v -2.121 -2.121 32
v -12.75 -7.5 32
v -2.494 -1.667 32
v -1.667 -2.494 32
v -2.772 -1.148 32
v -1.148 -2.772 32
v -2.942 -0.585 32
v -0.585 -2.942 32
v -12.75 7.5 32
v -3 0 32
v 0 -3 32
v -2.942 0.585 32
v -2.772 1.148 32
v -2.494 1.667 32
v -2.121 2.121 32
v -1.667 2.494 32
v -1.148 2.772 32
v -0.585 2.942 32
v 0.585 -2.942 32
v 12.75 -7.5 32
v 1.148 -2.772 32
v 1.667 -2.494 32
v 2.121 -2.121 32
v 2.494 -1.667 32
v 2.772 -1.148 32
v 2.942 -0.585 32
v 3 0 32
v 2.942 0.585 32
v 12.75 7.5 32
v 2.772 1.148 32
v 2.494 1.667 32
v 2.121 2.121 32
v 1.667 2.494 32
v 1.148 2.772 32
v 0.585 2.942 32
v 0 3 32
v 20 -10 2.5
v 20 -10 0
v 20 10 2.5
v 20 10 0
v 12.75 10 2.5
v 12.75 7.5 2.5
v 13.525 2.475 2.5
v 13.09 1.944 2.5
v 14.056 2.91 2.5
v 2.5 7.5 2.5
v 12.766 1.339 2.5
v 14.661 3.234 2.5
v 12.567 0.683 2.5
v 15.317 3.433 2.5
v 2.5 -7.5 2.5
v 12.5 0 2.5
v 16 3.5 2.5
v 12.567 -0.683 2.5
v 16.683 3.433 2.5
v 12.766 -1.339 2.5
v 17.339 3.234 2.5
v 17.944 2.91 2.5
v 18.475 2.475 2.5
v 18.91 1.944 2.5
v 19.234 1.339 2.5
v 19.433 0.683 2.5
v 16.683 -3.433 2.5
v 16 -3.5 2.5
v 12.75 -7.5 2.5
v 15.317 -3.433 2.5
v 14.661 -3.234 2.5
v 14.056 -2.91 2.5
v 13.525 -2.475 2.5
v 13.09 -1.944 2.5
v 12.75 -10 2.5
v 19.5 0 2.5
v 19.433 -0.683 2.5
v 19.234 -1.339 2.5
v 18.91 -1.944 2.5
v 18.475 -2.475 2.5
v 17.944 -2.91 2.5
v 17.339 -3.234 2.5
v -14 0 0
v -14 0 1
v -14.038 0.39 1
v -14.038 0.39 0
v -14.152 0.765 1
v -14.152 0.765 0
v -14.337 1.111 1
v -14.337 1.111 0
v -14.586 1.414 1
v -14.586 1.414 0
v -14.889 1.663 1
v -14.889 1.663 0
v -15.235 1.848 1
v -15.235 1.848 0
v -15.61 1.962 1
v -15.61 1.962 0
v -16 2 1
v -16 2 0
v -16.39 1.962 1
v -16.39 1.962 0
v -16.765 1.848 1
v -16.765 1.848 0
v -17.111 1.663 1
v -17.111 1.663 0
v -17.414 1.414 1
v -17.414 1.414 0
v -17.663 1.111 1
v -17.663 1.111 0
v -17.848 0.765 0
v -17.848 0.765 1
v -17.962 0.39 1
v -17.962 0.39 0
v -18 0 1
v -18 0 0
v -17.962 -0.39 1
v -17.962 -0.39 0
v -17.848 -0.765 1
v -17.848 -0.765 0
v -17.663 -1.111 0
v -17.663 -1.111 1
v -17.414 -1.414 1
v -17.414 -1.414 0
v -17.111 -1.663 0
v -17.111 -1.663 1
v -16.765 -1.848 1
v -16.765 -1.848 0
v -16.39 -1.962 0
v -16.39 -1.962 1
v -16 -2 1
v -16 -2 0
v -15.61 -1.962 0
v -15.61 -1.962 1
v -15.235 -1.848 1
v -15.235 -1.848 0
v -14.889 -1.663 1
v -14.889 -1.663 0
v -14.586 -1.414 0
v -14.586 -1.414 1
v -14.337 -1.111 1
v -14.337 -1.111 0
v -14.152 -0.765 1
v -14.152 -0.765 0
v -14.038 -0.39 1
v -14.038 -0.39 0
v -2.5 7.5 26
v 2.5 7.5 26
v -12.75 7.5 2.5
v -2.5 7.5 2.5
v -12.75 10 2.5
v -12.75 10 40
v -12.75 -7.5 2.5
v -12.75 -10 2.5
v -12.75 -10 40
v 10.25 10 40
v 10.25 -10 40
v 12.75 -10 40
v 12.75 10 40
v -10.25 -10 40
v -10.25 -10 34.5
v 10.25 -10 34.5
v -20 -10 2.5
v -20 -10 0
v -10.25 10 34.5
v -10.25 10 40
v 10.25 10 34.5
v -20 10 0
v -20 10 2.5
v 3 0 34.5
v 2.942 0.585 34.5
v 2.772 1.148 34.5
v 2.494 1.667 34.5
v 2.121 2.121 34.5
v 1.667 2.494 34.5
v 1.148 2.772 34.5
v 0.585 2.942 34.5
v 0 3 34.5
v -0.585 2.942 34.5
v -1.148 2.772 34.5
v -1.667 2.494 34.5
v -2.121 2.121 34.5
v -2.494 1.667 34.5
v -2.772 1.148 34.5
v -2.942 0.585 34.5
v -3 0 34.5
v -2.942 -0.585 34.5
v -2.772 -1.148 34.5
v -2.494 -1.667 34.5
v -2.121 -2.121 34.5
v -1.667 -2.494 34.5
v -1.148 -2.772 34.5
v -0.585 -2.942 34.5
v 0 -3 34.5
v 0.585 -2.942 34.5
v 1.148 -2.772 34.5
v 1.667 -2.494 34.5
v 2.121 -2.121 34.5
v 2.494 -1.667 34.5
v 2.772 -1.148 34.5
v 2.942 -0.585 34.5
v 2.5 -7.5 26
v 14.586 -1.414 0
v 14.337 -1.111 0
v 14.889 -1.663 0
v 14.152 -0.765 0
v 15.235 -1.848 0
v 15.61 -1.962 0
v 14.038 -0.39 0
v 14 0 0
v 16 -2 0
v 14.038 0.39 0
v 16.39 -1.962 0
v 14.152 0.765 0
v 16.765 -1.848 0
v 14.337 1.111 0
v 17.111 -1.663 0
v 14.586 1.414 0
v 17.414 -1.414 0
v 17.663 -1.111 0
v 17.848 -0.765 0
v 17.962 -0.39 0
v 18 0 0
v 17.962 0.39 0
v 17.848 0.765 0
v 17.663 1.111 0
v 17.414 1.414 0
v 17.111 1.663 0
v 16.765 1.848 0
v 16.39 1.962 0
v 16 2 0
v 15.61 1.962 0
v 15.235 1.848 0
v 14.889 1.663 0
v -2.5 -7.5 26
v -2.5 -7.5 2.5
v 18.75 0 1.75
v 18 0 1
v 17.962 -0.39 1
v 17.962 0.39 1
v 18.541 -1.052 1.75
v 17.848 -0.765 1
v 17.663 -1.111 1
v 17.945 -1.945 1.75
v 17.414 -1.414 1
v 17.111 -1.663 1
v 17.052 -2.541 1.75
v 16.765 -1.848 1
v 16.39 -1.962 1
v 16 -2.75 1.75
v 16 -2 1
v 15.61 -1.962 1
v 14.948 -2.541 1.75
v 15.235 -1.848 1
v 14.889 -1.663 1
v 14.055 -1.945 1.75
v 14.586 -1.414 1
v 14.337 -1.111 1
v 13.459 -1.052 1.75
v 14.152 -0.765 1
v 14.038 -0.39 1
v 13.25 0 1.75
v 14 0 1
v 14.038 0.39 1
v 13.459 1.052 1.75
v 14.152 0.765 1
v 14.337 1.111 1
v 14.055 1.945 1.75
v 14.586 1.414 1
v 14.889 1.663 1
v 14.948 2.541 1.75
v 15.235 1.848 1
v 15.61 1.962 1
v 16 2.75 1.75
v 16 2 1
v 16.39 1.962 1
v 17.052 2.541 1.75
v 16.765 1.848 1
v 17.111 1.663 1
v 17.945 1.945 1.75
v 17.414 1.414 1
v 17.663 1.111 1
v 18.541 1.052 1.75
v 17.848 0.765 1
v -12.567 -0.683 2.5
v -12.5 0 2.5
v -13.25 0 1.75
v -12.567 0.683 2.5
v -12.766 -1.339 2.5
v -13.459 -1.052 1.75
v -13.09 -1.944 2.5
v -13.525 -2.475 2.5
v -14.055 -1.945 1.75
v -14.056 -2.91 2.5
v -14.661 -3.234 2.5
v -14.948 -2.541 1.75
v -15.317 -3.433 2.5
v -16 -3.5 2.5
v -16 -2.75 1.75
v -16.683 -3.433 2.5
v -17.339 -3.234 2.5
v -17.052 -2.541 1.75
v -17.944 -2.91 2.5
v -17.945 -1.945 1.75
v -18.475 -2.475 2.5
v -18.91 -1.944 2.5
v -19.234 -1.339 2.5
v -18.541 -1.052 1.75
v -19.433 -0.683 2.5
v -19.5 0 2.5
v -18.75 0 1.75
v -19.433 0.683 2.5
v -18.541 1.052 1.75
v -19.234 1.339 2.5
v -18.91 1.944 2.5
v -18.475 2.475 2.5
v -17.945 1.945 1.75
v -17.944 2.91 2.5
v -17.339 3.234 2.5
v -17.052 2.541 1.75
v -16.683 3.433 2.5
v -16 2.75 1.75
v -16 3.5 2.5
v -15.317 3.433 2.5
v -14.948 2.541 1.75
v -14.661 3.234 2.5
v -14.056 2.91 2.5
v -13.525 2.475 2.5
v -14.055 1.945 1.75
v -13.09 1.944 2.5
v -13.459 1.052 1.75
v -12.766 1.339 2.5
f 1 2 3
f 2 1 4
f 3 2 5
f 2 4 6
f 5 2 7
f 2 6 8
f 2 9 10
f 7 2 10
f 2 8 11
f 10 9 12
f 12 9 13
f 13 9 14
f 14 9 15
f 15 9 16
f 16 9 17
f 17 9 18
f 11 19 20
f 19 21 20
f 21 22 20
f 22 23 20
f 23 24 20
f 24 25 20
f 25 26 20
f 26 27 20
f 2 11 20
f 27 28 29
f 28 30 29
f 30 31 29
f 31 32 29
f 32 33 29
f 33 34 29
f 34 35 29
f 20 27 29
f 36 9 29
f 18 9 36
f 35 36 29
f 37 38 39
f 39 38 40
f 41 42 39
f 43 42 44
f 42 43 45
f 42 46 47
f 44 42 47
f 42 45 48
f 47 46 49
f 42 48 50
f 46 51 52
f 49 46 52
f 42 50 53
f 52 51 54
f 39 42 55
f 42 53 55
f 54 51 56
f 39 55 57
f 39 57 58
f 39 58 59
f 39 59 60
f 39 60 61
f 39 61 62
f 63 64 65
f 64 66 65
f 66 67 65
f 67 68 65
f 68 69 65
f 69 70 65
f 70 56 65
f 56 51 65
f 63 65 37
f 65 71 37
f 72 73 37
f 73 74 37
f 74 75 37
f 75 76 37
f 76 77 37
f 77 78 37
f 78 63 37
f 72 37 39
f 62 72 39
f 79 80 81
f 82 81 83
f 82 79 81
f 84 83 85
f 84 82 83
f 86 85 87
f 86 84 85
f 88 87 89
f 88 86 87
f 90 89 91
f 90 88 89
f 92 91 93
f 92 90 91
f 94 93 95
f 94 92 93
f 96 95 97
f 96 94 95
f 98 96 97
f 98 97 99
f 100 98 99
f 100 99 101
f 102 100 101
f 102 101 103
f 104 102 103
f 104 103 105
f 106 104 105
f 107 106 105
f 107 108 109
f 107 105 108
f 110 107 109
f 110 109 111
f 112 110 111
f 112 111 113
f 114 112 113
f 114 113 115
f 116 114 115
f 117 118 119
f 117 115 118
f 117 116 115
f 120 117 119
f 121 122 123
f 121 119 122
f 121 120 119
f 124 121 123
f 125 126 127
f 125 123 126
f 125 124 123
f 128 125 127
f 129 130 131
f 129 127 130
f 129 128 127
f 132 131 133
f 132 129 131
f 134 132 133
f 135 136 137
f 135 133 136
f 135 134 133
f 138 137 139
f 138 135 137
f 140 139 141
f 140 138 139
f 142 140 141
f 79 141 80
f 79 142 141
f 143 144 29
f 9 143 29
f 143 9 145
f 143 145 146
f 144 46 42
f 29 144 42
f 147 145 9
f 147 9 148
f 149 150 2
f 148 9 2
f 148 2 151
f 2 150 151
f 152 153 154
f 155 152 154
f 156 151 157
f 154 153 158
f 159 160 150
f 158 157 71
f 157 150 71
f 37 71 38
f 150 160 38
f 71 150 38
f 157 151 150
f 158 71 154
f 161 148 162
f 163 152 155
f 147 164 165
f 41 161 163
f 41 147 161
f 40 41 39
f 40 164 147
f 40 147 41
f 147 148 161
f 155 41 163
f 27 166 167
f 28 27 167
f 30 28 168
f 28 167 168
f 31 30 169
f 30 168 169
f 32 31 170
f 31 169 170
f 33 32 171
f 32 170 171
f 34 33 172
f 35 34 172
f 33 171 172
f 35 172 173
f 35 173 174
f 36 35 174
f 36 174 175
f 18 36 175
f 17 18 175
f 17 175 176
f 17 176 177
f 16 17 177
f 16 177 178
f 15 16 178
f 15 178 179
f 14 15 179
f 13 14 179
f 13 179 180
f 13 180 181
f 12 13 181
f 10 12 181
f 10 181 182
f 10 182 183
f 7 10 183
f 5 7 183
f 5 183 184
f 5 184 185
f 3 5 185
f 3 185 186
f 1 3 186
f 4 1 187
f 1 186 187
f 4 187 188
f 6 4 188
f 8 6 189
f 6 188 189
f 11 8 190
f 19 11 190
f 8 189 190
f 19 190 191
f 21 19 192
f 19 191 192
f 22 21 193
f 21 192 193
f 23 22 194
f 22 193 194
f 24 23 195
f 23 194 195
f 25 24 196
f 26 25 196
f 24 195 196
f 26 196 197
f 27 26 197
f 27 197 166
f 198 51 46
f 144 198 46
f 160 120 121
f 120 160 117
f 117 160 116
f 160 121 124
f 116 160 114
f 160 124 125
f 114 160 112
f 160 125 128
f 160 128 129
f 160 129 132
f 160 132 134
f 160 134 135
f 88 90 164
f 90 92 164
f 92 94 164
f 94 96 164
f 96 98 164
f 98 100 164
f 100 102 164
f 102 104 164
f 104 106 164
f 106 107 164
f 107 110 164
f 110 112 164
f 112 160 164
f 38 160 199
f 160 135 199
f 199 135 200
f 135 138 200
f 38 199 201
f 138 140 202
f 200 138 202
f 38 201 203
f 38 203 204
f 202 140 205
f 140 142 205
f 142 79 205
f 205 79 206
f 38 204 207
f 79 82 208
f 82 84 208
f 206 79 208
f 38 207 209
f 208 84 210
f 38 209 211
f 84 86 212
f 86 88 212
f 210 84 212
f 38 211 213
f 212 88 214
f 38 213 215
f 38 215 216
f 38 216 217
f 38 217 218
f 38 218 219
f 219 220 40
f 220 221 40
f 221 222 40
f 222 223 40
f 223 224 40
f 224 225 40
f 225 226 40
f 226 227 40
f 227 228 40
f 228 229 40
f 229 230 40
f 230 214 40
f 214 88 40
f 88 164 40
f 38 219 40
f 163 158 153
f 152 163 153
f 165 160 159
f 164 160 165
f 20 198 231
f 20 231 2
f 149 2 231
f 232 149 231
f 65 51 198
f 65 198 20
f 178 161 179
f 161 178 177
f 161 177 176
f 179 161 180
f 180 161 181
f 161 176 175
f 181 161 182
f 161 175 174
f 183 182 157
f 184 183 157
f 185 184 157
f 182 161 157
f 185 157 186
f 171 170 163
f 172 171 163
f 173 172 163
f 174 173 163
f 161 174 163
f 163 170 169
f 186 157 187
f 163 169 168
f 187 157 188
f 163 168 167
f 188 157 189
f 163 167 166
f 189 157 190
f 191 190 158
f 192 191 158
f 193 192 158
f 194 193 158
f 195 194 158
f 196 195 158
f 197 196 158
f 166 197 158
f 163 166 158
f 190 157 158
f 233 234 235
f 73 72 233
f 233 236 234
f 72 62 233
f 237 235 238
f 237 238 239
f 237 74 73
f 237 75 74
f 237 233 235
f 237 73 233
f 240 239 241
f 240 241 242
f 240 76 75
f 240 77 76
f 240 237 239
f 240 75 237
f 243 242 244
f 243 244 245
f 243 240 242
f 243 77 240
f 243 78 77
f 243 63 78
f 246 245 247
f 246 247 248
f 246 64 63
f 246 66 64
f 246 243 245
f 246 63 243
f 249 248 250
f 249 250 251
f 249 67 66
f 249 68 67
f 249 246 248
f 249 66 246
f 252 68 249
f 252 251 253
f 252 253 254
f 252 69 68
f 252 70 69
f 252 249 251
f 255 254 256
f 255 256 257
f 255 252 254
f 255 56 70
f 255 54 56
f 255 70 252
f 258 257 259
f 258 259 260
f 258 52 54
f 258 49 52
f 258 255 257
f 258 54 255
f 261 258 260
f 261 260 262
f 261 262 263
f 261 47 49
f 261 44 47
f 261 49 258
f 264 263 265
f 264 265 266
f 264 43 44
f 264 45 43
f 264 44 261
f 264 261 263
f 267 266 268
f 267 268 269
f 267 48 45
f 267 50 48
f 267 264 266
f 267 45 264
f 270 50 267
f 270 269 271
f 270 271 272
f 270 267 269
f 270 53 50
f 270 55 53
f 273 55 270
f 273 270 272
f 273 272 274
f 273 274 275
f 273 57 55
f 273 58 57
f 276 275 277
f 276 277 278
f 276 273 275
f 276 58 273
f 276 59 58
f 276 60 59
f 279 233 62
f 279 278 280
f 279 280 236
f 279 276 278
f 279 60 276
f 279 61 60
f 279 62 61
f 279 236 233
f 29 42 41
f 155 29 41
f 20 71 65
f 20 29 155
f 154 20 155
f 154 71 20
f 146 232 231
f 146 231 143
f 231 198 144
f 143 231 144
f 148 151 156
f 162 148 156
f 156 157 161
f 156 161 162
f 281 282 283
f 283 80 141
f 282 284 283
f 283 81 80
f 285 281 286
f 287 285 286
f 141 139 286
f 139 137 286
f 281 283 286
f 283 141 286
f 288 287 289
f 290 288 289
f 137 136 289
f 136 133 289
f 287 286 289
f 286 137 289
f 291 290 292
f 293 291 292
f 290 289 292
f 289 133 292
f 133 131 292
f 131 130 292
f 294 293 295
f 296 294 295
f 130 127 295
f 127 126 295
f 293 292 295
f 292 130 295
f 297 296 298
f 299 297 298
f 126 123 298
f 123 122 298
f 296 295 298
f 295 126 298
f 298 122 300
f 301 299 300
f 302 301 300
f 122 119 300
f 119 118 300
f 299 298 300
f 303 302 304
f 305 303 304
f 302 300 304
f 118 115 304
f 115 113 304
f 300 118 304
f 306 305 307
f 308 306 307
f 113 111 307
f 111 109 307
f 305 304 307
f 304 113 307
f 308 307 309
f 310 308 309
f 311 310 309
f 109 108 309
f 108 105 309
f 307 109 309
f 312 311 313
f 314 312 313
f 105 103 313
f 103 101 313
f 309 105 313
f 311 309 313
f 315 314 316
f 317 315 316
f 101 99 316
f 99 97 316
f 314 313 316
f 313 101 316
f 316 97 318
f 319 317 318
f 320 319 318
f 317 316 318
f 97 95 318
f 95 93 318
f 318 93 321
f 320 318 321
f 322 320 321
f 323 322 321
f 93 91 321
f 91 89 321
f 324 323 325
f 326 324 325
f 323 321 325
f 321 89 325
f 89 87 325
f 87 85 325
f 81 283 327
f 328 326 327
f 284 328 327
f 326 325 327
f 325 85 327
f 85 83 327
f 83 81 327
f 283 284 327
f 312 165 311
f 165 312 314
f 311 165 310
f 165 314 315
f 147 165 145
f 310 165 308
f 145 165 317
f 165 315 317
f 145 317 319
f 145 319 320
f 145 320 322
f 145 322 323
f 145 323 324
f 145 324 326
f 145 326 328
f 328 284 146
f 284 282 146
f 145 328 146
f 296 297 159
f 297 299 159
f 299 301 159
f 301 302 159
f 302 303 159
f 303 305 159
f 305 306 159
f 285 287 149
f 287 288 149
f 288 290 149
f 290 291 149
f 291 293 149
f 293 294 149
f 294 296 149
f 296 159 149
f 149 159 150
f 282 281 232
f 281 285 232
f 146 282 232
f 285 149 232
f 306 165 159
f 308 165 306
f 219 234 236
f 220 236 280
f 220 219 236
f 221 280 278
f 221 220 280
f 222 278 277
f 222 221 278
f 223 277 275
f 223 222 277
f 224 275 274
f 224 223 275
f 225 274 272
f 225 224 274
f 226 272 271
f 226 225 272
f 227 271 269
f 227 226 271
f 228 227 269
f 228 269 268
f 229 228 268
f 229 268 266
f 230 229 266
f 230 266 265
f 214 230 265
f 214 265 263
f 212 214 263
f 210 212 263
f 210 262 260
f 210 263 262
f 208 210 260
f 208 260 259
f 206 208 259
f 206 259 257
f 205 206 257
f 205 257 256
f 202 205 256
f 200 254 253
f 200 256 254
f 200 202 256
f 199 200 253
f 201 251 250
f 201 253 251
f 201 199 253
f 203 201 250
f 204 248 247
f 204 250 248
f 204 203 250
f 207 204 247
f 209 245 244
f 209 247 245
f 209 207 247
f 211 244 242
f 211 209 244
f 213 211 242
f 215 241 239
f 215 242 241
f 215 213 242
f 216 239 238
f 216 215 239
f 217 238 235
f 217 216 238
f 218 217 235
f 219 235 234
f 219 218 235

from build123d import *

# Parameters (mm, degrees)
F0_W          = 40
F0_H          = 20
F1_DEPTH      = 40
F3_START      = 2.5
F2_W          = 17.5
F2_H          = 15
F3_DEPTH      = 29.5
F4_W          = 20.5
F4_H          = 5.5
F4_W_2        = 7.25
F4_H_2        = 37.5
F5_DEPTH      = 25
F5_DEPTH_BACK = 25
F6_W          = 15
F6_H          = 6
F7_DEPTH      = 25
F7_DEPTH_BACK = 25
F8_R          = 2
F9_DEPTH      = 25
F9_DEPTH_BACK = 25
F10_SIZE      = 1.5
F12_R         = 3
F13_DEPTH     = 3


with BuildPart() as f1:
    # F0 (on Top) → F1 (new body)
    with BuildSketch(Plane.XY):
        Rectangle(F0_W, F0_H)
    extrude(amount=F1_DEPTH)

    # F2 (on Top) → F3 (cut)
    with BuildSketch(Plane.XY.offset(F3_START)):
        with Locations((-11.25, 0)):
            Rectangle(F2_W, F2_H)
        with Locations((11.25, 0)):
            Rectangle(F2_W, F2_H)
    extrude(amount=F3_DEPTH, mode=Mode.SUBTRACT)

    # F4 (on Front) → F5 (cut, two sides)
    with BuildSketch(Plane.XZ) as f5_sk:
        with Locations((0, 37.25)):
            Rectangle(F4_W, F4_H)
        with Locations((-16.375, 21.25)):
            Rectangle(F4_W_2, F4_H_2)
        with Locations((16.375, 21.25)):
            Rectangle(F4_W_2, F4_H_2)
    extrude(amount=-F5_DEPTH, mode=Mode.SUBTRACT)
    extrude(f5_sk.sketch, amount=F5_DEPTH_BACK, mode=Mode.SUBTRACT)

    # F6 (on Right) → F7 (cut, two sides)
    with BuildSketch(Plane.YZ) as f7_sk:
        with Locations((0, 29)):
            Rectangle(F6_W, F6_H)
    extrude(amount=-F7_DEPTH, mode=Mode.SUBTRACT)
    extrude(f7_sk.sketch, amount=F7_DEPTH_BACK, mode=Mode.SUBTRACT)

    # F8 (on Top) → F9 (cut, two sides)
    with BuildSketch(Plane.XY) as f9_sk:
        with Locations((-16, 0)):
            Circle(F8_R)
        with Locations((16, 0)):
            Circle(F8_R)
    extrude(amount=-F9_DEPTH, mode=Mode.SUBTRACT)
    extrude(f9_sk.sketch, amount=F9_DEPTH_BACK, mode=Mode.SUBTRACT)

    # F10
    f10_edges = [f1.edges().sort_by_distance(p)[0] for p in [
        (-18, 0, 2.5),
        (14, 0, 2.5),
    ]]
    chamfer(f10_edges, length=F10_SIZE)

    # F12 (on offset) → F13 (cut)
    with BuildSketch(Plane.XY.offset(34.5)):
        Circle(F12_R)
    extrude(amount=-F13_DEPTH, mode=Mode.SUBTRACT)


solid = f1.part
